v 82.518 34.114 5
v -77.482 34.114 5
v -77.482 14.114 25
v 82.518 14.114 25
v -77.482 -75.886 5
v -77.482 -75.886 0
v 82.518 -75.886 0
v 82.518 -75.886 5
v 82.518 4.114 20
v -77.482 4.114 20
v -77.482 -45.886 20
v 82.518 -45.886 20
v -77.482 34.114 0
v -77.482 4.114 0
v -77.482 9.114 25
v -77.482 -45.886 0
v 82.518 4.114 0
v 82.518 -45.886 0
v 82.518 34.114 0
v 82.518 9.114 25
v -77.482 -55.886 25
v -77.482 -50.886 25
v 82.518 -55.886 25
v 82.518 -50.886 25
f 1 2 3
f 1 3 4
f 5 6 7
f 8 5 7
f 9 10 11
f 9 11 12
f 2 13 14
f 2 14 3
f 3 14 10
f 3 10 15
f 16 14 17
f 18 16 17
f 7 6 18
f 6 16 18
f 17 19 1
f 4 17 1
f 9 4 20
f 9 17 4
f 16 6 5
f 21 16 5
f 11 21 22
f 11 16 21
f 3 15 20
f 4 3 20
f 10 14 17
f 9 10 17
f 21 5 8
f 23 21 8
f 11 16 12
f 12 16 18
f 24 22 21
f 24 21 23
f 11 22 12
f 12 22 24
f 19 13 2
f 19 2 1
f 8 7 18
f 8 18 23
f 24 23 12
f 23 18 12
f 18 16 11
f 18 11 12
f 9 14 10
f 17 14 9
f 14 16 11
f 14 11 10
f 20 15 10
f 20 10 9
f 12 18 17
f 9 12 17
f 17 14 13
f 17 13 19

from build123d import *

# Parameters (mm, degrees)
F0_W      = 160
F0_H      = 5
F1_DEPTH  = 25
F0_H_2    = 50
F2_DEPTH  = 20
F3_SIZE   = 4.99999
F3_2_SIZE = 4.99999
F4_DEPTH  = 25
F5_DEPTH  = 25
F6_SIZE   = 20
F6_2_SIZE = 20


# Not quite as in the source:
# - a fillet or chamfer is up to 0.001 mm smaller than in the source, because OpenCascade refuses the exact size


with BuildPart() as f1:
    # F0 (on Top) → F1 (new body)
    with BuildSketch(Plane.XY):
        with Locations((2.5181677192, 6.6137810796)):
            Rectangle(F0_W, F0_H)
    extrude(amount=F1_DEPTH)

    # F3 (size 5 in the source; OpenCascade refuses exactly that, so slightly less here)
    f3_edges = [f1.edges().sort_by_distance(p)[0] for p in [
        (2.518168, 4.113781, 25),
    ]]
    chamfer(f3_edges, length=F3_SIZE)

    # F4 (add): a face of the model
    f4_faces = [f1.faces().sort_by_distance(p)[0] for p in [
        (2.5181677192, 9.1137810796, 12.5),
    ]]
    extrude(f4_faces, amount=F4_DEPTH)

    # F6
    f6_edges = [f1.edges().sort_by_distance(p)[0] for p in [
        (2.518168, 34.113781, 25),
    ]]
    chamfer(f6_edges, length=F6_SIZE)


with BuildPart() as f1b:
    # F0 (on Top) → F1, piece 2 (new body)
    with BuildSketch(Plane.XY):
        with Locations((2.5181677192, -48.3862189204)):
            Rectangle(F0_W, F0_H)
    extrude(amount=F1_DEPTH)

    # F3#2 (size 5 in the source; OpenCascade refuses exactly that, so slightly less here)
    f3_2_edges = [f1b.edges().sort_by_distance(p)[0] for p in [
        (2.518168, -45.886219, 25),
    ]]
    chamfer(f3_2_edges, length=F3_2_SIZE)

    # F5 (add): a face of the model
    f5_faces = [f1b.faces().sort_by_distance(p)[0] for p in [
        (2.5181677192, -50.8862189204, 12.5),
    ]]
    extrude(f5_faces, amount=F5_DEPTH)

    # F6#2
    f6_2_edges = [f1b.edges().sort_by_distance(p)[0] for p in [
        (2.518168, -75.886219, 25),
    ]]
    chamfer(f6_2_edges, length=F6_2_SIZE)


with BuildPart() as f2:
    # F0 (on Top) → F2 (new body)
    with BuildSketch(Plane.XY):
        with Locations((2.5181677192, -20.8862189204)):
            Rectangle(F0_W, F0_H_2)
    extrude(amount=F2_DEPTH)


solid = Compound([f1.part, f1b.part, f2.part])
